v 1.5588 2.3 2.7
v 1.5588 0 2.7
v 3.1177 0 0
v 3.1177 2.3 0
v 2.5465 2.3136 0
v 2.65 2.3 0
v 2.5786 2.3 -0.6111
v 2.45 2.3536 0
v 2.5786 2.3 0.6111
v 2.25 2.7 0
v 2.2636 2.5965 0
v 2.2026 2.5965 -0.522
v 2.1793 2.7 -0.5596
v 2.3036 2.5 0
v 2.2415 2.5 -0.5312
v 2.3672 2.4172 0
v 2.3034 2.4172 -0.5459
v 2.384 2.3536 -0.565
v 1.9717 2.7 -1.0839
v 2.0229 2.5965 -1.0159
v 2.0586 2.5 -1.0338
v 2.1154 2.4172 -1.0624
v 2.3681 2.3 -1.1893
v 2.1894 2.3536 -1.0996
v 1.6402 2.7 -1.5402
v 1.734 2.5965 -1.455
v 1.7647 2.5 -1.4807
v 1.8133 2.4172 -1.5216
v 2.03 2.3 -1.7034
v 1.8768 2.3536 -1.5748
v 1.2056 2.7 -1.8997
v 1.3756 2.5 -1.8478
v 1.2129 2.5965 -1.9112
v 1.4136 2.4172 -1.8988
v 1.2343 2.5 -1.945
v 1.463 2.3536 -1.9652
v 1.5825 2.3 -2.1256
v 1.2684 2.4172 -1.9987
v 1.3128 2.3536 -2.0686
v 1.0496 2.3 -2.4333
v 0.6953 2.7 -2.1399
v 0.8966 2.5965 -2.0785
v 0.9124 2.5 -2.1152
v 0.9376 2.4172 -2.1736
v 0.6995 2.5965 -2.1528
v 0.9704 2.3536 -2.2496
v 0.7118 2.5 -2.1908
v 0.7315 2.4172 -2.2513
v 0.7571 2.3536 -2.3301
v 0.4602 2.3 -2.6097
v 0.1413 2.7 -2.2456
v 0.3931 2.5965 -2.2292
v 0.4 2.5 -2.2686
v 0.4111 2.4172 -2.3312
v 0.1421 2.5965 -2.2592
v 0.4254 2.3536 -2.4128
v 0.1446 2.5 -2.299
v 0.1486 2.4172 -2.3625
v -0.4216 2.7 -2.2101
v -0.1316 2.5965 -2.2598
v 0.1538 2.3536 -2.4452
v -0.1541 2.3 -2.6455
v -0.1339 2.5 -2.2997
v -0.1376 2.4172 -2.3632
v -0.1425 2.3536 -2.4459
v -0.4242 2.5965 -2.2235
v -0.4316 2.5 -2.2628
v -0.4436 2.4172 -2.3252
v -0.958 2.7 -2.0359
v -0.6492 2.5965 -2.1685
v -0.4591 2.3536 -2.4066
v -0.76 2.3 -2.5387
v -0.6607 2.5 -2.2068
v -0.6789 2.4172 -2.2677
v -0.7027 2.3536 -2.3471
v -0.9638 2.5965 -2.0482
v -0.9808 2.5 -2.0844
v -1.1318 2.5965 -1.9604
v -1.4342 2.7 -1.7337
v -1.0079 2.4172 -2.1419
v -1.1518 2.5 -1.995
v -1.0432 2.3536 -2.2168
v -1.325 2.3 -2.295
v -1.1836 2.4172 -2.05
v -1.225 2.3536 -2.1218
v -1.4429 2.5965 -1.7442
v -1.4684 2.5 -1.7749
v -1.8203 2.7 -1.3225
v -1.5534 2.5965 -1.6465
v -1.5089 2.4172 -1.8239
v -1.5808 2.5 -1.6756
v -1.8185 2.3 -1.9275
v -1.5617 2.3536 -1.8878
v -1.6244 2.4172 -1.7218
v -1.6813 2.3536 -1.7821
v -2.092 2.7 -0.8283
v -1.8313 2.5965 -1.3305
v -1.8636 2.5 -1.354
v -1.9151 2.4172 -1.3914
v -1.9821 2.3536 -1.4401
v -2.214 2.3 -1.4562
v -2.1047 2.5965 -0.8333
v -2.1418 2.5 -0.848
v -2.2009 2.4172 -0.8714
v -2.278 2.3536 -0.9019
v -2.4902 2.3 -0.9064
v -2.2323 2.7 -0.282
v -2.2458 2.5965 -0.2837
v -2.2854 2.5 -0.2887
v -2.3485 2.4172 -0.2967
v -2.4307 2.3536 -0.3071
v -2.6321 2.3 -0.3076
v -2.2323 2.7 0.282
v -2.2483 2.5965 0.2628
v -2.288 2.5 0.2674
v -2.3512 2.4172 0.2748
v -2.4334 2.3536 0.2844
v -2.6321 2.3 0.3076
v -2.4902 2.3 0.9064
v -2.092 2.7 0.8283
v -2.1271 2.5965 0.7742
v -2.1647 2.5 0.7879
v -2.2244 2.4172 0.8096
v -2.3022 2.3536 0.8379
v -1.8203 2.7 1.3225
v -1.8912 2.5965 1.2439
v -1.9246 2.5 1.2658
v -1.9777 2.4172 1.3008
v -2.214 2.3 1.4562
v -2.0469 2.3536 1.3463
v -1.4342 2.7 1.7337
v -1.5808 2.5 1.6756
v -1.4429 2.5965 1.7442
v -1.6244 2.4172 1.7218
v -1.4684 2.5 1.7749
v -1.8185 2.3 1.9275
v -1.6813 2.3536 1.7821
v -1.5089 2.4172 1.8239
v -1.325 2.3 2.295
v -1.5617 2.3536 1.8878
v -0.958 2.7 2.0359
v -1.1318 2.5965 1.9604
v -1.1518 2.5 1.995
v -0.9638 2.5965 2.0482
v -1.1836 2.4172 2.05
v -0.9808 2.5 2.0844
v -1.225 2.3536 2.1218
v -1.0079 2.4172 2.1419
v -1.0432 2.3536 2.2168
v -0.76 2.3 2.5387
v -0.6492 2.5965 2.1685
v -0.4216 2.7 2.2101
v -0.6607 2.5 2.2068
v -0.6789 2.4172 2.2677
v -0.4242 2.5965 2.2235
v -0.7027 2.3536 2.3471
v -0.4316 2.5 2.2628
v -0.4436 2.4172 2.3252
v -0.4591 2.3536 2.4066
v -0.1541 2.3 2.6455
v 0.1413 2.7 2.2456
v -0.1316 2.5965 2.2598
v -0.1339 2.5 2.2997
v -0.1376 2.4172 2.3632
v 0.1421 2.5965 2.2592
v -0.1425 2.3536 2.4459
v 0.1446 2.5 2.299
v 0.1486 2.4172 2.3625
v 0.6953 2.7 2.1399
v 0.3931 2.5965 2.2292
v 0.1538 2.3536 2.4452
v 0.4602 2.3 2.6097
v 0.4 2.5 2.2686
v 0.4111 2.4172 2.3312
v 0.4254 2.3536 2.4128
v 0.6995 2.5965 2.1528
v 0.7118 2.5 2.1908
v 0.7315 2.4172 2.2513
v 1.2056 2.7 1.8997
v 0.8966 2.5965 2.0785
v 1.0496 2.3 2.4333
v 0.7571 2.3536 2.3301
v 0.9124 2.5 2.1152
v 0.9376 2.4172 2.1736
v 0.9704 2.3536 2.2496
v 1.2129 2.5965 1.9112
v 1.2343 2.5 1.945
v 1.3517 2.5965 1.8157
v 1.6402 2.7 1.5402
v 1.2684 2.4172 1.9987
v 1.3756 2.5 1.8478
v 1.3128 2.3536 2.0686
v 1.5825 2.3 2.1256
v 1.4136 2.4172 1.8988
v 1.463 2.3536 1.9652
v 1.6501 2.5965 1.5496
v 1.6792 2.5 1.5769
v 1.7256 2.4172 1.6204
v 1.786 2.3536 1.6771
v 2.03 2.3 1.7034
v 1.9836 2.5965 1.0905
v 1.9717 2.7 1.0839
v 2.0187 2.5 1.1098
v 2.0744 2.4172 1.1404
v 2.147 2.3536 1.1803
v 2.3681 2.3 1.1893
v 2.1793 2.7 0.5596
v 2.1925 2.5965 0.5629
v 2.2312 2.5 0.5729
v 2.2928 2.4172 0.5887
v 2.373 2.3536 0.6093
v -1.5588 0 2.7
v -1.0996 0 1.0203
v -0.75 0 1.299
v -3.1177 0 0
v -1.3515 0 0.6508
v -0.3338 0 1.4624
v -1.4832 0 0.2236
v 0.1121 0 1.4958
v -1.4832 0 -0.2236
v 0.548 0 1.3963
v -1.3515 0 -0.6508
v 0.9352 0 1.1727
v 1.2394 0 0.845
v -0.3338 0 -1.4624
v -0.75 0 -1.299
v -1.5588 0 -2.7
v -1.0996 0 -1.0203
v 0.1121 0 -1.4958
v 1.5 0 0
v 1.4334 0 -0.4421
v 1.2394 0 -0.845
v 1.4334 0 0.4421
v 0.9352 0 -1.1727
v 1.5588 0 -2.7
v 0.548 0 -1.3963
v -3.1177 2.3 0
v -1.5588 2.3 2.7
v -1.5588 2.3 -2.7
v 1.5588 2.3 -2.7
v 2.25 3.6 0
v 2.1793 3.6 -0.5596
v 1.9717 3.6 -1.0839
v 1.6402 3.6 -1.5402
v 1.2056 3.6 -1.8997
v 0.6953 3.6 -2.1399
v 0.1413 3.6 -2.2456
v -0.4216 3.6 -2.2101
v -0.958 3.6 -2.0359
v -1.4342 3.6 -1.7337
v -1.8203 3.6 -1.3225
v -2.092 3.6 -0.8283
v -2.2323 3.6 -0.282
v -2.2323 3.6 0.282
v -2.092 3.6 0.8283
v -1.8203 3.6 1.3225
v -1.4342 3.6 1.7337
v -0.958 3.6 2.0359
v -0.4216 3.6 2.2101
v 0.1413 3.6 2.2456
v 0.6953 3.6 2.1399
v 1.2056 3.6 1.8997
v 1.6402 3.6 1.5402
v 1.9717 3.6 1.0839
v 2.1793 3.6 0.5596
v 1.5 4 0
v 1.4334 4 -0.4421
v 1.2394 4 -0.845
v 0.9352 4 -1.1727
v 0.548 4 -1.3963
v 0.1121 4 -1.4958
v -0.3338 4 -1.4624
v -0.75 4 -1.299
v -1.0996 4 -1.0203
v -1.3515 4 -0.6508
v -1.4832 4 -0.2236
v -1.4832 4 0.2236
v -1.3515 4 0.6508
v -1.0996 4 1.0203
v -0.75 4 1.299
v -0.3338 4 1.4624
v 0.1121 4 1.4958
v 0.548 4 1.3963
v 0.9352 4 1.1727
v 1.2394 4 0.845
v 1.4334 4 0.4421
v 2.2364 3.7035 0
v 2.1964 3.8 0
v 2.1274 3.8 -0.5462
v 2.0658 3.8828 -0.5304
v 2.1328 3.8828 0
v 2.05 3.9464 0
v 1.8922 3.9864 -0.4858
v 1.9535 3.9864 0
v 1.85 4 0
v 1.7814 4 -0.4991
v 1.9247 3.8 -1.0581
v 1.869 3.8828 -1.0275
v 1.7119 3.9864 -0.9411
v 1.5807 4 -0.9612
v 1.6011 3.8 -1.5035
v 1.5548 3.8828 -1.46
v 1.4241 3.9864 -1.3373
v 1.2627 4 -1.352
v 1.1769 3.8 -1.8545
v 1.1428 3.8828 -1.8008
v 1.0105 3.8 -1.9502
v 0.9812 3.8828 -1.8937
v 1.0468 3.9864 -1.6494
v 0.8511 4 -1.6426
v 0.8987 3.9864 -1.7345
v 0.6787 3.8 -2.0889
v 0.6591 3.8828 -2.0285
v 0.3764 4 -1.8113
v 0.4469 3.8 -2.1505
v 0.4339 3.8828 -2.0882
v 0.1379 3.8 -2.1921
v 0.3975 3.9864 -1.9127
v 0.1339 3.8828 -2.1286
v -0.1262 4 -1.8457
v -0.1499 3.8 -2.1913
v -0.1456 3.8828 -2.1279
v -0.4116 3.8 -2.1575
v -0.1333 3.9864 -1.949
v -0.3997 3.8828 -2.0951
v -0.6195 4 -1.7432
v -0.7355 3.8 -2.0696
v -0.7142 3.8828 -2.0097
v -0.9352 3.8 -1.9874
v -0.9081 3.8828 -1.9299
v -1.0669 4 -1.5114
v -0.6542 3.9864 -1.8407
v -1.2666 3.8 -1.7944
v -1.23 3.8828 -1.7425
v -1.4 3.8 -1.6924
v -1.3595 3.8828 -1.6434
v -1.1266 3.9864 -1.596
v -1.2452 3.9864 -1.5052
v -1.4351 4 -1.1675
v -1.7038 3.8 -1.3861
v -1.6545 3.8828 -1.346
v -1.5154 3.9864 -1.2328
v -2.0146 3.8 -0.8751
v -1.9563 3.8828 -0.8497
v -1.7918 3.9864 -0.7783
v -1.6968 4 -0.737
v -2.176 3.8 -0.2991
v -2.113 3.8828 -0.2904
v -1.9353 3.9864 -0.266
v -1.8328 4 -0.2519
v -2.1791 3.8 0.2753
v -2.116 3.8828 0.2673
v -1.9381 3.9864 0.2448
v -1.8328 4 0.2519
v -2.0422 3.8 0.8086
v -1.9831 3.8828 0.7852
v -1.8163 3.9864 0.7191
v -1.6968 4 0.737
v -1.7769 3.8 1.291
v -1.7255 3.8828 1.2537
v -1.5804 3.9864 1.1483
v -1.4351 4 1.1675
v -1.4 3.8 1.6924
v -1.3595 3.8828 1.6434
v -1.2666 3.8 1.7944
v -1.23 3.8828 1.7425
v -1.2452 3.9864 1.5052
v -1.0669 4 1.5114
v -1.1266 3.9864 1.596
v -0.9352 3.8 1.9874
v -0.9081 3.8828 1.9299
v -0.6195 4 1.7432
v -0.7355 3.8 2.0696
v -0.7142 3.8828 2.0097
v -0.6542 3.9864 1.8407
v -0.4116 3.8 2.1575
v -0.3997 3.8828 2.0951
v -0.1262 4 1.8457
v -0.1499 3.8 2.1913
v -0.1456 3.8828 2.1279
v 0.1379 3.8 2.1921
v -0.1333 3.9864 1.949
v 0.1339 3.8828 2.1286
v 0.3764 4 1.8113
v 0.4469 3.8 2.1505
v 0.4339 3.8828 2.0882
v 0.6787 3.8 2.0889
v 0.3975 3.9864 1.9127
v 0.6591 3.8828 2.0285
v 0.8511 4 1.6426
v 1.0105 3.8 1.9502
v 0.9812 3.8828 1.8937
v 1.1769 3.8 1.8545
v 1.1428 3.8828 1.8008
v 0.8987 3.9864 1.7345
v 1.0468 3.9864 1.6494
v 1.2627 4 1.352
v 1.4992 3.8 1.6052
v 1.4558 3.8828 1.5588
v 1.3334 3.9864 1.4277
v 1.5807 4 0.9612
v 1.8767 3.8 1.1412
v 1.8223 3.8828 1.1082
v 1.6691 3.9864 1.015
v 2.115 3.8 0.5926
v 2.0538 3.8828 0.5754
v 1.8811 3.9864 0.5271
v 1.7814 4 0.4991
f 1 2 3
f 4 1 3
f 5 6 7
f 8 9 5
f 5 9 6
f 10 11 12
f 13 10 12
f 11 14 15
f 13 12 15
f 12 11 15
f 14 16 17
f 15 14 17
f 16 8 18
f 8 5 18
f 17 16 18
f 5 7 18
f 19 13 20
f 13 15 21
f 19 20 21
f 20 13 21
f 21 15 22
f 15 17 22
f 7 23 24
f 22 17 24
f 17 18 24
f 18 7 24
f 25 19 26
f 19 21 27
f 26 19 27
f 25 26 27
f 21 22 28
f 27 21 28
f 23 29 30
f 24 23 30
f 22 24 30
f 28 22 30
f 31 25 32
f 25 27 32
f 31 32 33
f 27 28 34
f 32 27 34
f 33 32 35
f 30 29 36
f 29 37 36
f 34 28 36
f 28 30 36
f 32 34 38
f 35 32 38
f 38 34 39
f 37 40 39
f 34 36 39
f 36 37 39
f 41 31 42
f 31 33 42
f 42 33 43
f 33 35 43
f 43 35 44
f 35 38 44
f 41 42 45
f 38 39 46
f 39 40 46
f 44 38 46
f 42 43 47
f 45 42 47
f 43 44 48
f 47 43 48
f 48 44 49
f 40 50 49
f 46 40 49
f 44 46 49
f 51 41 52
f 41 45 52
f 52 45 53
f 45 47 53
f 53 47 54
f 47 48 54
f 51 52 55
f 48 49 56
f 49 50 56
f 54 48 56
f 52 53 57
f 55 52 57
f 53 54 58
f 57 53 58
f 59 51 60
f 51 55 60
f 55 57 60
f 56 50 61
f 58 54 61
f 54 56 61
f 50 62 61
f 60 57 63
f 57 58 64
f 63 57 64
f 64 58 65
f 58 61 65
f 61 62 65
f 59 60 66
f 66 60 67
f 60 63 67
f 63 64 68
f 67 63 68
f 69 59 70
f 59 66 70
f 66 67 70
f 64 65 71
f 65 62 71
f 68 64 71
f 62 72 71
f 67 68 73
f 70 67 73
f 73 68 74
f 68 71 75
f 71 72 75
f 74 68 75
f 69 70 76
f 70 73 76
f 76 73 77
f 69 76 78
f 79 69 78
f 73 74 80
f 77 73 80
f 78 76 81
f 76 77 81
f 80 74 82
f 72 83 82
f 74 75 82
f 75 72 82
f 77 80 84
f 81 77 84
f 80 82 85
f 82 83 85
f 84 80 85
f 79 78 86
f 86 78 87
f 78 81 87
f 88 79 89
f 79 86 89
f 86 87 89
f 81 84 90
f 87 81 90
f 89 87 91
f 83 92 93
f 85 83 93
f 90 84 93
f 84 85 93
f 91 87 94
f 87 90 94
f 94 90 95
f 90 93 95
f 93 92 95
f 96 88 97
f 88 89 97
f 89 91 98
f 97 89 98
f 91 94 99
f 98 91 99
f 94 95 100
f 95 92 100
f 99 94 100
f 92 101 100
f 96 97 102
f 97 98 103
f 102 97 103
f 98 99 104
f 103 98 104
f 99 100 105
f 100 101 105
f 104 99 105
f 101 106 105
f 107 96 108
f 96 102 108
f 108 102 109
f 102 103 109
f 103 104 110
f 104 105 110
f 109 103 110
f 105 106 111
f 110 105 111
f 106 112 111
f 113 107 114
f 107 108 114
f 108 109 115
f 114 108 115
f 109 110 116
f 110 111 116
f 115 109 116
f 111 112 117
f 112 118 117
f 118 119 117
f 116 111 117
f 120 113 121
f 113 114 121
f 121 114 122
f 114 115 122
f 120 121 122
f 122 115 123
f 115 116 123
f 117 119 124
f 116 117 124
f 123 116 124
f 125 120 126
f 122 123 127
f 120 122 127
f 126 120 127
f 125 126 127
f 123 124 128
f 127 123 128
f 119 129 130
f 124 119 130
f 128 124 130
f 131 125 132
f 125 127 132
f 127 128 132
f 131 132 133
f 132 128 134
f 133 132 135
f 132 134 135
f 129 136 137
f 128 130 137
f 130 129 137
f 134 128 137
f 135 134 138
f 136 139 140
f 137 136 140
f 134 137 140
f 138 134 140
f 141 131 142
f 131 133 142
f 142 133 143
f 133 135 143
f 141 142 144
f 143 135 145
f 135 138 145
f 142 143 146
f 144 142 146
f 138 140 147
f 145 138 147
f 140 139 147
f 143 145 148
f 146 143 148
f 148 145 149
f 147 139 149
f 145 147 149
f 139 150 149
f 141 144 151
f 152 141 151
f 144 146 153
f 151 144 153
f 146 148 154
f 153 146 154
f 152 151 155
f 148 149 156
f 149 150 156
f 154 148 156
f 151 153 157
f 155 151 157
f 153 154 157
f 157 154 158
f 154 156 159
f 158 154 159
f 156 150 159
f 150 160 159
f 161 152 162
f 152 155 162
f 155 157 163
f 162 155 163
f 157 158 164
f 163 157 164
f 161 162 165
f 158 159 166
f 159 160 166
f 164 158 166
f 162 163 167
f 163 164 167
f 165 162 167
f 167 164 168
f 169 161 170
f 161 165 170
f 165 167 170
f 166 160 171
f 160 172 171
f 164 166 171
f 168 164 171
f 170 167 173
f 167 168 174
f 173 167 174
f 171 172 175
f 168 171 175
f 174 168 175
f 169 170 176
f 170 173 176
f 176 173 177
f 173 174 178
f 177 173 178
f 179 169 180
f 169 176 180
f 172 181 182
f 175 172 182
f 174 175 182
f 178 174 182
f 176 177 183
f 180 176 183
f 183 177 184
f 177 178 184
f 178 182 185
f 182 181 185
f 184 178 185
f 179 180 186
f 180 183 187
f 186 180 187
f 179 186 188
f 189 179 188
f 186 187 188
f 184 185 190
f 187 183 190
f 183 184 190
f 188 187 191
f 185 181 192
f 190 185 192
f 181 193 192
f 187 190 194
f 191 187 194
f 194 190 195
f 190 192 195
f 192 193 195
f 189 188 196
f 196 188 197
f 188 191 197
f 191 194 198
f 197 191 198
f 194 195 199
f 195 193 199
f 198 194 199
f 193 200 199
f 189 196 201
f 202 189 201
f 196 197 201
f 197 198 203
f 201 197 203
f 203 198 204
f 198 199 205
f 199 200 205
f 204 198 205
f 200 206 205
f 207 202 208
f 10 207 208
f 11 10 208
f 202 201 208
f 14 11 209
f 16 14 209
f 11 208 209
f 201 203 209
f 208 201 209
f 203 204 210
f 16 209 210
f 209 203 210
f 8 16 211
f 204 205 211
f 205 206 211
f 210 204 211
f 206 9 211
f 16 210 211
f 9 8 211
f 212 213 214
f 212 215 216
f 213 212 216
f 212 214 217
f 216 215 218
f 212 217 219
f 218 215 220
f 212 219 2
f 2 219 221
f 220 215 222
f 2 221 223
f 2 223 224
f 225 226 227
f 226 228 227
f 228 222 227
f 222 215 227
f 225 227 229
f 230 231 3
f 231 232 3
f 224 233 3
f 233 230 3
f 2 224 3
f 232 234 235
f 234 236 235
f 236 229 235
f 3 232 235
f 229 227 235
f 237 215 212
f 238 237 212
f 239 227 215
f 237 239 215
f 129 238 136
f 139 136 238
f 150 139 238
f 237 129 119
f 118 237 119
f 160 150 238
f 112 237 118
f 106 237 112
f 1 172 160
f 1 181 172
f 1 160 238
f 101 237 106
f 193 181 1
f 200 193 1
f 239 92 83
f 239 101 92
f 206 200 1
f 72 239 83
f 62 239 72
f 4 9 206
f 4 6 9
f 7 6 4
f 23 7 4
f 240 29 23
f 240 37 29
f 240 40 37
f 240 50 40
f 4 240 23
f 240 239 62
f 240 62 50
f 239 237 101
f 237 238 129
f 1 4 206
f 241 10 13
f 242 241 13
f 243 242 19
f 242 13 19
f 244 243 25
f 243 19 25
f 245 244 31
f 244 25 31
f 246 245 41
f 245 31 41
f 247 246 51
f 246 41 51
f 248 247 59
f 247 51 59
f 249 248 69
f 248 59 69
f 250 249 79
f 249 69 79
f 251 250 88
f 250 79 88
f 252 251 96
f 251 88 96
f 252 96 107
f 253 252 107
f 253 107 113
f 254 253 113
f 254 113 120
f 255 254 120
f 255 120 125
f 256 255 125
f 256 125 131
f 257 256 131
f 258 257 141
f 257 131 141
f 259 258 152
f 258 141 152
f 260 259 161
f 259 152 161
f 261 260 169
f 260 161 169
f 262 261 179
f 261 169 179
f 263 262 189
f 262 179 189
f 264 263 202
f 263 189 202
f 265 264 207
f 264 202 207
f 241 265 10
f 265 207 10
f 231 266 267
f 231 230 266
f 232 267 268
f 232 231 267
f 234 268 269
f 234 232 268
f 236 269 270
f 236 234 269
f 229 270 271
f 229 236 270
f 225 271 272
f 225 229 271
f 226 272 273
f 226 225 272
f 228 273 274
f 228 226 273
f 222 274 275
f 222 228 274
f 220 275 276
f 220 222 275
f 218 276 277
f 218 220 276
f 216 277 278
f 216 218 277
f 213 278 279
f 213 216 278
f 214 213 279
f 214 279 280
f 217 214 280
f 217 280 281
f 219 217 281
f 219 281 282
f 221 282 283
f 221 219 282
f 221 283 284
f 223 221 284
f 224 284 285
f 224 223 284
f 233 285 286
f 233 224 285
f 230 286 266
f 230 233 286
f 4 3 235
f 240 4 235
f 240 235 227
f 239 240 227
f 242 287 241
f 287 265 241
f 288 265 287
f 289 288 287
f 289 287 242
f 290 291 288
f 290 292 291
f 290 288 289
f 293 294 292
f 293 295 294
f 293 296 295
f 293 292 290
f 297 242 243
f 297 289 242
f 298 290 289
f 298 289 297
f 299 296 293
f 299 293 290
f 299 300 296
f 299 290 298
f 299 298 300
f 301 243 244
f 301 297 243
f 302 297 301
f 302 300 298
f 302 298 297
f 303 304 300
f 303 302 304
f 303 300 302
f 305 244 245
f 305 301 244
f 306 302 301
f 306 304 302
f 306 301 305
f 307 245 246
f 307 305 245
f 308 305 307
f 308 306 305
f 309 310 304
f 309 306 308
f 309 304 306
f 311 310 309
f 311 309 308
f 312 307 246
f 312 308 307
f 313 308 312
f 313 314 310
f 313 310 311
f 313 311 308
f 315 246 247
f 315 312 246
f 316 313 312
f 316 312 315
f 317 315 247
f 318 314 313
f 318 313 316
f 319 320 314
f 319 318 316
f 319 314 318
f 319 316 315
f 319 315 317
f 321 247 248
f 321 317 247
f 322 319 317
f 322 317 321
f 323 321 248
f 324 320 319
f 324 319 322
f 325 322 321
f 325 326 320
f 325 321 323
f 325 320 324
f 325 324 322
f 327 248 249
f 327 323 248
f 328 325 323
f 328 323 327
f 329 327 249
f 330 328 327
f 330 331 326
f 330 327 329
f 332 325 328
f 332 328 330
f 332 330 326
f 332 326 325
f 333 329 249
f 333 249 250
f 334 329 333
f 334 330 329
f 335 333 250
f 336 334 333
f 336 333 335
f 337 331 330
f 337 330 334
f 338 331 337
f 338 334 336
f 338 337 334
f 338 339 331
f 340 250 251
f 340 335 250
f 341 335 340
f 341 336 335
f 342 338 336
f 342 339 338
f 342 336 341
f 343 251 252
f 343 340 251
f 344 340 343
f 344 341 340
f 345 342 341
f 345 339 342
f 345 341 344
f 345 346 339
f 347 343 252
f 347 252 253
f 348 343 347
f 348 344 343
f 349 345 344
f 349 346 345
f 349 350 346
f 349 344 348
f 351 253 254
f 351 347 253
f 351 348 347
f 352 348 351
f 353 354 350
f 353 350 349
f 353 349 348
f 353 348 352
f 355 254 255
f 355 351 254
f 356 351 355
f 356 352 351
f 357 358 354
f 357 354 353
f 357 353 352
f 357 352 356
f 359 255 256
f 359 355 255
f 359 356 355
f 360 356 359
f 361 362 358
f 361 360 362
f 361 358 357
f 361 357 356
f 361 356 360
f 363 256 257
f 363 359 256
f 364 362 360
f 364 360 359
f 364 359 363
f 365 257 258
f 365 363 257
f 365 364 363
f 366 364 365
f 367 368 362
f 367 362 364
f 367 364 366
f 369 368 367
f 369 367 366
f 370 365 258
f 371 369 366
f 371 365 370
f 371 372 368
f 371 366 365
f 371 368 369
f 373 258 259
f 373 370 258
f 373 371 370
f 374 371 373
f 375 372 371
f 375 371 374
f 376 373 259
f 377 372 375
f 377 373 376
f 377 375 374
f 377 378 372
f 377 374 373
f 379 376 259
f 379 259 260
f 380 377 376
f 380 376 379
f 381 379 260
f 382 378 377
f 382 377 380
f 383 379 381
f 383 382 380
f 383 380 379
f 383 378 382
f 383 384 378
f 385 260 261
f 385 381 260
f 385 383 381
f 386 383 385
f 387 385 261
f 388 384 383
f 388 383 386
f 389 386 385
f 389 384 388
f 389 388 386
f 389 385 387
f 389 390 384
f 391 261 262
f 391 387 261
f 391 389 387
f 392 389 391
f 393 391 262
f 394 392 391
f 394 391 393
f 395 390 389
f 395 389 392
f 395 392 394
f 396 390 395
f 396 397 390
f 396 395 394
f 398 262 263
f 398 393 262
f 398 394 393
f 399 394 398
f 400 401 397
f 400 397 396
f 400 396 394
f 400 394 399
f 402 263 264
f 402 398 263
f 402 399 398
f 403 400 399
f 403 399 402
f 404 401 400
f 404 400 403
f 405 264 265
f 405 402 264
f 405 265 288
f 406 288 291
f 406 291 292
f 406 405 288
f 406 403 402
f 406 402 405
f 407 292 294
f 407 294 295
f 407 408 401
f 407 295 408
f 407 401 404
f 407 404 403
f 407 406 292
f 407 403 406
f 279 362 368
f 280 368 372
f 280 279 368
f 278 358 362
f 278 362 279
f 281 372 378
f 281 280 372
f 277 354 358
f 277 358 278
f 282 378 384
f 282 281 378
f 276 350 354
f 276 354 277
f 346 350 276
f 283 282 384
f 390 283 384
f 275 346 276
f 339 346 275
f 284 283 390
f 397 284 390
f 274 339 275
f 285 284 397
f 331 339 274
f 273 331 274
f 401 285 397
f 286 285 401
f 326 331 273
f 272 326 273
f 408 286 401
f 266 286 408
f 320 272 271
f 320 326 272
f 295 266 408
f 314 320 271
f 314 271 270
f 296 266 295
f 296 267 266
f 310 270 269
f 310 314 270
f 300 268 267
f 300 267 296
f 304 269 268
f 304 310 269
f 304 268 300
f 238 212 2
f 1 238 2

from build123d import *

# Parameters (mm, degrees)
SKETCH_1_R      = 1.5
EXTRUDE_1_DEPTH = 2.3
SKETCH_2_R      = 2.25
SKETCH_2_R_2    = 1.5
EXTRUDE_2_DEPTH = 1.7
FILLET_1_R      = 0.4


with BuildPart() as part:
    # 草图1 → 凸台-拉伸1 (new body)
    with BuildSketch(Plane(origin=(0, 0, 0), x_dir=(1, 0, 0), z_dir=(0, 1, 0))):
        Polygon((3.117691454, 0), (1.558845727, 2.7), (-1.558845727, 2.7), (-3.117691454, 0), (-1.558845727, -2.7), (1.558845727, -2.7), align=None)
        Circle(SKETCH_1_R, mode=Mode.SUBTRACT)
    extrude(amount=EXTRUDE_1_DEPTH)

    # 草图2 → 凸台-拉伸2 (add)
    with BuildSketch(Plane(origin=(0, 2.3, 0), x_dir=(1, 0, 0), z_dir=(0, 1, 0))):
        Circle(SKETCH_2_R)
        Circle(SKETCH_2_R_2, mode=Mode.SUBTRACT)
    extrude(amount=EXTRUDE_2_DEPTH)

    # 圆角1
    fillet_1_edges = [part.edges().sort_by_distance(p)[0] for p in [
        (-2.25, 2.3, 0),
        (-2.25, 4, 0),
    ]]
    fillet(fillet_1_edges, radius=FILLET_1_R)


solid = part.part
